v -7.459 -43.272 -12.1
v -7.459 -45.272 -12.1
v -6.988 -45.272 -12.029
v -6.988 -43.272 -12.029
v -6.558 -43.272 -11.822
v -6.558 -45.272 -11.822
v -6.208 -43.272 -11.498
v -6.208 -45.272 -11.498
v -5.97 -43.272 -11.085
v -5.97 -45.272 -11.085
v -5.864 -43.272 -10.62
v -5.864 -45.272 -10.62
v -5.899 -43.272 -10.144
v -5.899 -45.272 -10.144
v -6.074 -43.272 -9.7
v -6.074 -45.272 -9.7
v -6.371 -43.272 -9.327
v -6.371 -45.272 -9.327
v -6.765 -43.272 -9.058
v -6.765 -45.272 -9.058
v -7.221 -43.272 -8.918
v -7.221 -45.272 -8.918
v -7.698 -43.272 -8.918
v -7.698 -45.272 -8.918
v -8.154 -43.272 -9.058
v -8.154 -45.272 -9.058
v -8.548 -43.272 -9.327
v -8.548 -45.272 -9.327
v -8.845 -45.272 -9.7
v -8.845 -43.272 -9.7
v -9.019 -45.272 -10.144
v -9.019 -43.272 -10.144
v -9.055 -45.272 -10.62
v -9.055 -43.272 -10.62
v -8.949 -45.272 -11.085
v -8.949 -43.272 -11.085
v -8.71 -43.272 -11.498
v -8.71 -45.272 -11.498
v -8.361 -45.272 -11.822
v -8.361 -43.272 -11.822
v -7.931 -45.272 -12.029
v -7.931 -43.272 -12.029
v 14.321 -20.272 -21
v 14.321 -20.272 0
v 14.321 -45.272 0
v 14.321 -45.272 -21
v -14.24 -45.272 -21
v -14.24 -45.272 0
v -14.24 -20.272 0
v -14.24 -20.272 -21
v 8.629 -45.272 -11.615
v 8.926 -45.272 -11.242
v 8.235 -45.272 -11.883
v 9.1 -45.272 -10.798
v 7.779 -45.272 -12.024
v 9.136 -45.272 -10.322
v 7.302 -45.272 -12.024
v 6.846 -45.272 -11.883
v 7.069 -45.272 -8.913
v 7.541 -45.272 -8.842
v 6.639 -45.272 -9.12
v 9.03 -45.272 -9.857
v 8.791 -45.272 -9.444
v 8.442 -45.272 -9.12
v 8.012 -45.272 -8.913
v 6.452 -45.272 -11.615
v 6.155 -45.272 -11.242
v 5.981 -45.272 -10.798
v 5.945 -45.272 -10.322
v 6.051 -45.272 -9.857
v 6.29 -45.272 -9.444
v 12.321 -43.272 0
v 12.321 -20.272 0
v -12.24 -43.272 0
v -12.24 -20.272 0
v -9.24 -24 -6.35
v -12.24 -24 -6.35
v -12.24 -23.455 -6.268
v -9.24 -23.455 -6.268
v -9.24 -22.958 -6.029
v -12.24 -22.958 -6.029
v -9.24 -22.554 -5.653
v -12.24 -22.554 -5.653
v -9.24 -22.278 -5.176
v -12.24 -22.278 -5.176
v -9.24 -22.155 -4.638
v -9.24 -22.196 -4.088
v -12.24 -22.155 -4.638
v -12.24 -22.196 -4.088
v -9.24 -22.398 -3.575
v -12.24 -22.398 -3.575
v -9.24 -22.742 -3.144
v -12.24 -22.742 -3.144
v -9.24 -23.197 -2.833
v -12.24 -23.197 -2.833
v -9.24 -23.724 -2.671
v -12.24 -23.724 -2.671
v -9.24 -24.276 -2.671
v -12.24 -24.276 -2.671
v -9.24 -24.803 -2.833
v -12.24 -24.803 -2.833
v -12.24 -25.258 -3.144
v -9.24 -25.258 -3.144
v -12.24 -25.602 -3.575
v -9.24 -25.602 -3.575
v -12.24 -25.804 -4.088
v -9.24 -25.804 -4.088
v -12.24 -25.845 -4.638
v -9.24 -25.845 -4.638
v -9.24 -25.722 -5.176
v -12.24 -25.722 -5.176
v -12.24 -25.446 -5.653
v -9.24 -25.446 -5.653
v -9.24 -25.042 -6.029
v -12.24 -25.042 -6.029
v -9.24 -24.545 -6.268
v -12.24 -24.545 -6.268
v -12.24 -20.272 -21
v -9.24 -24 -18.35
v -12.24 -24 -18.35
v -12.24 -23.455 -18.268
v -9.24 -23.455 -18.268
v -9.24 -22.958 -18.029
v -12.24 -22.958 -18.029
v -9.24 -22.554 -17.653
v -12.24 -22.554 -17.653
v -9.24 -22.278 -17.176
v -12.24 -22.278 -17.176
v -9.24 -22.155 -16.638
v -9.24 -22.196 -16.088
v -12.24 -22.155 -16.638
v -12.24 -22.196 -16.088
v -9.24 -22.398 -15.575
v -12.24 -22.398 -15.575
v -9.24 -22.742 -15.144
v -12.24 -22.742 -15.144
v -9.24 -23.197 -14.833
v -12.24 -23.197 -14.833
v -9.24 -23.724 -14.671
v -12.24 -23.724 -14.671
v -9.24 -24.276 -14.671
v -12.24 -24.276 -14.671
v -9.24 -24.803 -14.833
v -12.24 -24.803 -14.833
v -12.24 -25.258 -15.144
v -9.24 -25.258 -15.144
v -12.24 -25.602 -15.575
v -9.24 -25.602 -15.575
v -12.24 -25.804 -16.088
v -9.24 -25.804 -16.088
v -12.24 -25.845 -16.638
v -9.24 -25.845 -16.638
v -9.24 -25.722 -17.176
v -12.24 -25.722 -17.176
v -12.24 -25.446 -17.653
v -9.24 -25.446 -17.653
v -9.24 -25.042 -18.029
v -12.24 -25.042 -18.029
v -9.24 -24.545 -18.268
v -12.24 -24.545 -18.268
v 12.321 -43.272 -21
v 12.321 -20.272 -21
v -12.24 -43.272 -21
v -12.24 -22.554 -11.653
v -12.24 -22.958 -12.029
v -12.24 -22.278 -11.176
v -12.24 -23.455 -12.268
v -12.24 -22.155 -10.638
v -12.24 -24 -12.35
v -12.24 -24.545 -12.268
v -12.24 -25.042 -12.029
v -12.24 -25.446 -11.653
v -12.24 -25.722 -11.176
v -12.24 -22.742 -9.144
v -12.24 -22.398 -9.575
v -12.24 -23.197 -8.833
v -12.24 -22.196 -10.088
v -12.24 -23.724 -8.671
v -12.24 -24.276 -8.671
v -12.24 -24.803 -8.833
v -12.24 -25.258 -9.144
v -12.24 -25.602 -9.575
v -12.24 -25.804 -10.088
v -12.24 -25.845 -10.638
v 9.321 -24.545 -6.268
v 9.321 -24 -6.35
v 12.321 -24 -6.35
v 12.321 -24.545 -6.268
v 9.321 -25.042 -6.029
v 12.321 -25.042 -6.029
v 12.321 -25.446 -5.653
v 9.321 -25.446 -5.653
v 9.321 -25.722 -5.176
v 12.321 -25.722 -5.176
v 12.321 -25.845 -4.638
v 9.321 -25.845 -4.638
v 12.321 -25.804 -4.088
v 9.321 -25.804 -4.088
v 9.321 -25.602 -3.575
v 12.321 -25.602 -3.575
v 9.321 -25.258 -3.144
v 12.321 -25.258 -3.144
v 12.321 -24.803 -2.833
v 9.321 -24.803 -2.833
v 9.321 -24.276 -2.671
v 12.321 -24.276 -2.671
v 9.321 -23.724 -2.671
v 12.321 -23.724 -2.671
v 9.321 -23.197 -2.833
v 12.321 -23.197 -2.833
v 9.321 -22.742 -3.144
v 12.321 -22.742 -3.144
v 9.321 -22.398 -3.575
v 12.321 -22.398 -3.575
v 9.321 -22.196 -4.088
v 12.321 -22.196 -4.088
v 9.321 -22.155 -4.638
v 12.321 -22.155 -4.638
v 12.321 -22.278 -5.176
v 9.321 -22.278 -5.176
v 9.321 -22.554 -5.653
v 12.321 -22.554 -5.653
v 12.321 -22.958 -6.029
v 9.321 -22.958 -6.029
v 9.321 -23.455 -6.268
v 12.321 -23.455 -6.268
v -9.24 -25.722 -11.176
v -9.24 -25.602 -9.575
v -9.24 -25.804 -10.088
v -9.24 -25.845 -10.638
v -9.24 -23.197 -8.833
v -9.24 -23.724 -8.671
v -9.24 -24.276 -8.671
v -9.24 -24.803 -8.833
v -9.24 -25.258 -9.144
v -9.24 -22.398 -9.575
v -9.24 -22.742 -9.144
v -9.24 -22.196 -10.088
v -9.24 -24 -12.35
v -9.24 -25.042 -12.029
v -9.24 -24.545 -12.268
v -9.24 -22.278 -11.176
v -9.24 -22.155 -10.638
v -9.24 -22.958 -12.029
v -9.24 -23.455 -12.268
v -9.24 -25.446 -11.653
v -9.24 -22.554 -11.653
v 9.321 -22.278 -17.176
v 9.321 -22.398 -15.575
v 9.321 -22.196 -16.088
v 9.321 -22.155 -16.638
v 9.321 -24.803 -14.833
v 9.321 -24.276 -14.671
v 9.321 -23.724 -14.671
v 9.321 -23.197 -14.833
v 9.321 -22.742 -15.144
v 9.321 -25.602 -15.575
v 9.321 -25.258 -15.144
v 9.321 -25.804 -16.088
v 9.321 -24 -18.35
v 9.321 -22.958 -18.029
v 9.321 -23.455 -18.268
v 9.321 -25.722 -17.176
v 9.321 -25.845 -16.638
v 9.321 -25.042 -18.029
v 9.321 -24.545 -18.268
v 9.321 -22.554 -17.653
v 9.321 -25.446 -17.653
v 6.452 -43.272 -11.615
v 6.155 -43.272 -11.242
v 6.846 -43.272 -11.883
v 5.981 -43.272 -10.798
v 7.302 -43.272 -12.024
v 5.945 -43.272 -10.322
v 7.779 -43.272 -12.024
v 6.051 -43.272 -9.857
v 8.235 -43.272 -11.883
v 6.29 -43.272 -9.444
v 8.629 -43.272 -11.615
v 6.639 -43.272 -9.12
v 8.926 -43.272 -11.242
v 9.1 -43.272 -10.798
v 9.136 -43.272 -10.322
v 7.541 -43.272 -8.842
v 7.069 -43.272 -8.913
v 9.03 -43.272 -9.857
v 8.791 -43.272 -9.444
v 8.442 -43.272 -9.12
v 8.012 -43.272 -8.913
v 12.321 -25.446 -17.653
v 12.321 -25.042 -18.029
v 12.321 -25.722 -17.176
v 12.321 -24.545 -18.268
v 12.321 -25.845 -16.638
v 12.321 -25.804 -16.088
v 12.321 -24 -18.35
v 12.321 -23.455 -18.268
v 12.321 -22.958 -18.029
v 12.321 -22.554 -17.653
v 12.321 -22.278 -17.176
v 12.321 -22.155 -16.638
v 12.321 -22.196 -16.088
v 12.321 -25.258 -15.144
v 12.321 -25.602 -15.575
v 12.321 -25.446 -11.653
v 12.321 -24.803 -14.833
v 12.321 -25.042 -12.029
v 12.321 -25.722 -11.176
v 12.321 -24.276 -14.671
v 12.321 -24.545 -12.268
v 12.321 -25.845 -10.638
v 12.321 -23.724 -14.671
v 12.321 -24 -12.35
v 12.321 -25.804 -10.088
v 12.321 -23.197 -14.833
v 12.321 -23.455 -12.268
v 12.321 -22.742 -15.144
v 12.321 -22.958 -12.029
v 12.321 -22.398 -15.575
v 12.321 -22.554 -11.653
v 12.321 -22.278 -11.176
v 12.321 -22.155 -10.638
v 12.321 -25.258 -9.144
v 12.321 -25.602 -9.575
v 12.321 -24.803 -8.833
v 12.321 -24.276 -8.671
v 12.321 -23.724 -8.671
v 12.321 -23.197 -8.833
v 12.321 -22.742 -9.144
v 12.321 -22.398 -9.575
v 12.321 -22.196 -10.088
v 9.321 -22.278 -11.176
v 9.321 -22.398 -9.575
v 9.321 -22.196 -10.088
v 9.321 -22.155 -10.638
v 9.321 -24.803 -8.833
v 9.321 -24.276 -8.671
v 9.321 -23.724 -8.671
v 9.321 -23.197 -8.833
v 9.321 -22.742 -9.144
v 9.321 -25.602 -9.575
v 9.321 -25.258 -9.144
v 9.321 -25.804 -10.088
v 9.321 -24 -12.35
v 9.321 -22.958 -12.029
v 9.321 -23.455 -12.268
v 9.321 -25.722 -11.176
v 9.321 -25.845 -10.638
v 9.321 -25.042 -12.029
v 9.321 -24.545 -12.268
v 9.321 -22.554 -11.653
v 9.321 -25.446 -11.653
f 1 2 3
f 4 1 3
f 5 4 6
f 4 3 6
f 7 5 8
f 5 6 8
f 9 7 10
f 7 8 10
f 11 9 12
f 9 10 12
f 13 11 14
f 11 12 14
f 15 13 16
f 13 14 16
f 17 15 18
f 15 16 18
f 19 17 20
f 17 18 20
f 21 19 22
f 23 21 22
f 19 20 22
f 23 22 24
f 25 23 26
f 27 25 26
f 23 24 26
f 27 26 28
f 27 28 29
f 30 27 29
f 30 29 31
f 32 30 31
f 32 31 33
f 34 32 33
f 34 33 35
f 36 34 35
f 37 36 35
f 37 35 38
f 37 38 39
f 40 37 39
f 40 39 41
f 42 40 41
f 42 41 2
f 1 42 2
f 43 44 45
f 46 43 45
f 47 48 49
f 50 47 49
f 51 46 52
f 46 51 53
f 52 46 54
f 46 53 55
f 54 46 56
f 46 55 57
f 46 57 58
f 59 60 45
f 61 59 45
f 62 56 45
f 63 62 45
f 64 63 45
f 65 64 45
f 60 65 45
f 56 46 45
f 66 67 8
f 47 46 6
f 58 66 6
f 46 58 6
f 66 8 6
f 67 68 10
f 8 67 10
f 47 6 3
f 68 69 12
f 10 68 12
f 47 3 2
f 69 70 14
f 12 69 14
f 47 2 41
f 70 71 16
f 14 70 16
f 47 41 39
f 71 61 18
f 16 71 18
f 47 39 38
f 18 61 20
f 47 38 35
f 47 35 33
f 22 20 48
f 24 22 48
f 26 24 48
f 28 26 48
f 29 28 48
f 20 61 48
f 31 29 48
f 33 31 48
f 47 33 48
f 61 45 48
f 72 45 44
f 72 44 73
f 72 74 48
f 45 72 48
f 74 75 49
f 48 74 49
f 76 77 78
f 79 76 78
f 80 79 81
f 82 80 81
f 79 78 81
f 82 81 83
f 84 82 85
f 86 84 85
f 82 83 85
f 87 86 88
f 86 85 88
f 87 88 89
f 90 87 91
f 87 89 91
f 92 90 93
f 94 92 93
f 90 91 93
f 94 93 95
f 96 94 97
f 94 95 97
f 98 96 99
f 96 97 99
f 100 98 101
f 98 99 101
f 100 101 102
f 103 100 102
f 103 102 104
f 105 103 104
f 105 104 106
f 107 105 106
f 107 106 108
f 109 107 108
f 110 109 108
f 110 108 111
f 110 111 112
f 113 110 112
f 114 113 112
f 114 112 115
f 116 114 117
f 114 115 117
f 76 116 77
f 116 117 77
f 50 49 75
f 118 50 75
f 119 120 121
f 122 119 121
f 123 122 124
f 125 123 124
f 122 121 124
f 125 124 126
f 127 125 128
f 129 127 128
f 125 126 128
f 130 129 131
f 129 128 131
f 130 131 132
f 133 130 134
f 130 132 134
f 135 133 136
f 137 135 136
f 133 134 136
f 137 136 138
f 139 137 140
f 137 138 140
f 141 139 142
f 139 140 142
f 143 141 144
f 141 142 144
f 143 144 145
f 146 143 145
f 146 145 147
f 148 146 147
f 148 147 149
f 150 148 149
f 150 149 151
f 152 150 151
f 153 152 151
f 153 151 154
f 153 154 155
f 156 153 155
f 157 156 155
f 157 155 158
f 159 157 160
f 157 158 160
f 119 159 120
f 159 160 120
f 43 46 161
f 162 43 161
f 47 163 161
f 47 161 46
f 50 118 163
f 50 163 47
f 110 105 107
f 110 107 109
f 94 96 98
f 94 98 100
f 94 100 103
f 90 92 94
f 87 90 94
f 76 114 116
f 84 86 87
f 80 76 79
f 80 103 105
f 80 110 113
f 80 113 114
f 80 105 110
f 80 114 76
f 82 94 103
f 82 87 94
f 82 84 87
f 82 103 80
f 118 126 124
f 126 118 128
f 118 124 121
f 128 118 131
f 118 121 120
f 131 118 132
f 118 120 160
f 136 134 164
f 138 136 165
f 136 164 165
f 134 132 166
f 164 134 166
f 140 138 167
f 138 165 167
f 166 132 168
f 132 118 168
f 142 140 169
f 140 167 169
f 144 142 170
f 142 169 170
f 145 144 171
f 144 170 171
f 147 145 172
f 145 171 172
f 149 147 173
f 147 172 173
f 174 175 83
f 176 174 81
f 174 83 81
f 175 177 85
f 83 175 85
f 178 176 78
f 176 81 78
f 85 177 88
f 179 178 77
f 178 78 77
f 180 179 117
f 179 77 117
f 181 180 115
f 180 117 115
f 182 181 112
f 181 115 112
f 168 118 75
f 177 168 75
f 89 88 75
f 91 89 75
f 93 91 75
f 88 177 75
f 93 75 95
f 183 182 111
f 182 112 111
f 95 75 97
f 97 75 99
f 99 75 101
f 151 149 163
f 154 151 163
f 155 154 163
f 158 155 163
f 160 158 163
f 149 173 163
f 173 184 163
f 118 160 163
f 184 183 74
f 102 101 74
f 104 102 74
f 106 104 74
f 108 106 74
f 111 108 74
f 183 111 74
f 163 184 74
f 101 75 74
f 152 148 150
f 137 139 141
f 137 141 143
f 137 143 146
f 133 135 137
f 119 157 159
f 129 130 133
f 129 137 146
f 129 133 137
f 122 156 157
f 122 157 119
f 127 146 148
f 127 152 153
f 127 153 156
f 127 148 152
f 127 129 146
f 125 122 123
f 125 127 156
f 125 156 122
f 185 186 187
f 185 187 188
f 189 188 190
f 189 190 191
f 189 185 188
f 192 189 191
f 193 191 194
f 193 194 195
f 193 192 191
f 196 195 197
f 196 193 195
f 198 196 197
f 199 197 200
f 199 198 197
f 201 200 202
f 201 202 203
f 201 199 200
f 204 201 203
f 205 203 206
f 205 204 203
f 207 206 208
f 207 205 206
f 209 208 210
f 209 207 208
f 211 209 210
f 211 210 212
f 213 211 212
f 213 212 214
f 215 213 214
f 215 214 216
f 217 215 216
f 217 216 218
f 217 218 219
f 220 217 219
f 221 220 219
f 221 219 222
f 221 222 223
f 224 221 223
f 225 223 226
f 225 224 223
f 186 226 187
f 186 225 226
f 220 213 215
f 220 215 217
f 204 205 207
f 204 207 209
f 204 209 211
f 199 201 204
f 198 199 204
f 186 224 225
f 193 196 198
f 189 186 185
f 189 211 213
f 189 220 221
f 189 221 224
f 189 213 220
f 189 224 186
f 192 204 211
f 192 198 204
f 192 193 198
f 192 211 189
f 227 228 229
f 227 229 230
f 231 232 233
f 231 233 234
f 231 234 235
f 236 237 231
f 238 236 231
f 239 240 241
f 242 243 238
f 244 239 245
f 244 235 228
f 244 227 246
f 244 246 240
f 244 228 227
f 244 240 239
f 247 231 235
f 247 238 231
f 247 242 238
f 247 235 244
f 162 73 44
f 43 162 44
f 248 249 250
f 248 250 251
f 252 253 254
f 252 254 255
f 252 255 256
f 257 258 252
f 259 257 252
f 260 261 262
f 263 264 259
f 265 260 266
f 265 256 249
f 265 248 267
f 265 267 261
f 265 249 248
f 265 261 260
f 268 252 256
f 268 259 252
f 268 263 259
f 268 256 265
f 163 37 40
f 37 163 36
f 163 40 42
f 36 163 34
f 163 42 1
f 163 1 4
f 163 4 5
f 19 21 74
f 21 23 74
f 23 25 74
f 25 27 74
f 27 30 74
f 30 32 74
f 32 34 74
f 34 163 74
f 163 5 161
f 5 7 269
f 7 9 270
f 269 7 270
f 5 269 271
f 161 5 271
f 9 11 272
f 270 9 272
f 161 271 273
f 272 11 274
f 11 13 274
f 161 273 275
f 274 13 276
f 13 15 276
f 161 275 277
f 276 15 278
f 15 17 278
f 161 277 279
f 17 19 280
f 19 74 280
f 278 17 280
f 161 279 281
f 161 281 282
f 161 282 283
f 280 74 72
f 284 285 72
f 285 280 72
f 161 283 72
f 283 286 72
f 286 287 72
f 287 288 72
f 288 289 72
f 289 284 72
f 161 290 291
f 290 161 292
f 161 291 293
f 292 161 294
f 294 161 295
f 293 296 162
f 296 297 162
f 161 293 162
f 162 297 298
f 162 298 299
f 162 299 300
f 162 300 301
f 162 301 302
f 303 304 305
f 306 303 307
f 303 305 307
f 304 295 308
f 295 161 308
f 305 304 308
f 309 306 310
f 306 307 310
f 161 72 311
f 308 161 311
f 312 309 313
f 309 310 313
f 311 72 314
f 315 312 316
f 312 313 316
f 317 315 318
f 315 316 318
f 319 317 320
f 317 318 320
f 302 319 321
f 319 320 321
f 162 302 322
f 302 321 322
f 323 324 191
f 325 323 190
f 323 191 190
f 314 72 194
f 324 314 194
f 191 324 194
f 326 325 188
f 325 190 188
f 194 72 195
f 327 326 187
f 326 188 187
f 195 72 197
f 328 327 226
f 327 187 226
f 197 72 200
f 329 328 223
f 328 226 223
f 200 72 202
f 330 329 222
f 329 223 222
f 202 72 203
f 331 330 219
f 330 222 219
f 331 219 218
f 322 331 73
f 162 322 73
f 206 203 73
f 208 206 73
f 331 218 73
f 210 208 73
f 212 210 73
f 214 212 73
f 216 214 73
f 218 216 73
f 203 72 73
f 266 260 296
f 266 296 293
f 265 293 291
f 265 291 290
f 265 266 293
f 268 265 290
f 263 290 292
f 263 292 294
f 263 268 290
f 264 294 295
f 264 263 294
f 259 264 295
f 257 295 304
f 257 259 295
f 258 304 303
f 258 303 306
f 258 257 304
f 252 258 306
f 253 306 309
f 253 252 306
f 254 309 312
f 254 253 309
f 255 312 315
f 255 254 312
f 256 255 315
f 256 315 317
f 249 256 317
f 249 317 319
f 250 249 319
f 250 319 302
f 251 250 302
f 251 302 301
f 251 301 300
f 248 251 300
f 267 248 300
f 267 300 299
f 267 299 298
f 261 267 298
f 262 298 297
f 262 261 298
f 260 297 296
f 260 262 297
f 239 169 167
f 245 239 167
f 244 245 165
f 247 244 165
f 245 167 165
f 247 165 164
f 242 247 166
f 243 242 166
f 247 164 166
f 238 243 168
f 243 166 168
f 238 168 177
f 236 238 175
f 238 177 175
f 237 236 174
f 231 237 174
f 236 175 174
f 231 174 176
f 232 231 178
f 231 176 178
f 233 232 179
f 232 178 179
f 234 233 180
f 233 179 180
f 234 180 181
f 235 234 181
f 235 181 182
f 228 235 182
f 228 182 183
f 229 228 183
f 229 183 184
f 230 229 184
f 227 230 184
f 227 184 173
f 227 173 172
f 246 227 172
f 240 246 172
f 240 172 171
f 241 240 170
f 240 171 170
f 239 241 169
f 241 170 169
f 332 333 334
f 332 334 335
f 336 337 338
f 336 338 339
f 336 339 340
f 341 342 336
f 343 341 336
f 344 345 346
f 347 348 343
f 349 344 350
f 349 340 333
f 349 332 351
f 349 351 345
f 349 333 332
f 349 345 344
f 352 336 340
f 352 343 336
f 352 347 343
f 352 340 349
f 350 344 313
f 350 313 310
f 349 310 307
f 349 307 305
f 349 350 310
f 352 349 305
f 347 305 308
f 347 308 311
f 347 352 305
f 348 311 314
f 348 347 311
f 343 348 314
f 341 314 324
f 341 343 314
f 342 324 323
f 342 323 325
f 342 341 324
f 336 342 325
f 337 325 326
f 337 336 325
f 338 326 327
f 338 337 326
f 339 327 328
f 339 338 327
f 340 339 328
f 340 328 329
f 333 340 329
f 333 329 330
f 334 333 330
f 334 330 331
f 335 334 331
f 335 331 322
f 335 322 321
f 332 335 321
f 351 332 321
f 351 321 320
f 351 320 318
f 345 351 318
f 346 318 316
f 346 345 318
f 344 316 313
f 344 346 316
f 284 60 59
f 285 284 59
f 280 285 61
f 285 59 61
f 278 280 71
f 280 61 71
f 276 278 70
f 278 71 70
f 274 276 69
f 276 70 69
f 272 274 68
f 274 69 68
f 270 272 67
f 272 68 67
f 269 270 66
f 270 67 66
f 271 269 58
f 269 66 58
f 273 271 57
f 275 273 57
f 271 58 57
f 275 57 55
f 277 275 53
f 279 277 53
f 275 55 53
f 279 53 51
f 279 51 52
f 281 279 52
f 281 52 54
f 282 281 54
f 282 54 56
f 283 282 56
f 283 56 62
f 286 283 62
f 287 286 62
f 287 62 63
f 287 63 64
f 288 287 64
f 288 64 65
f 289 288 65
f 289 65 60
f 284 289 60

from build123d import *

# Parameters (mm, degrees)
BOSS_EXTRUDE4_DEPTH = 21
SKETCH7_R           = 1.6
CUT_EXTRUDE1_DEPTH  = 3
SKETCH5_R           = 1.85
BOSS_EXTRUDE5_DEPTH = 3
BOSS_EXTRUDE6_START = 3
SKETCH8_R           = 1.85
BOSS_EXTRUDE6_DEPTH = 3


with BuildPart() as part:
    # Sketch1 → Boss-Extrude4 (new body)
    with BuildSketch(Plane.XY):
        Polygon((12.320696932, -20.271970514), (14.320696932, -20.271970514), (14.320696932, -45.271970514), (-14.239524115, -45.271970514), (-14.239524115, -20.271970514), (-12.239524115, -20.271970514), (-12.239524115, -43.271970514), (12.320696932, -43.271970514), align=None)
    extrude(amount=-BOSS_EXTRUDE4_DEPTH)

    # Sketch7 → Cut-Extrude1 (cut)
    with BuildSketch(Plane.XZ.offset(45.271970514)):
        with Locations(Location((-7.459347, -10.5, 0), (0, 0, 270))):
            Circle(SKETCH7_R)
        with Locations(Location((7.540540263, -10.441844196, 0), (0, 0, 90))):
            Circle(SKETCH7_R)
    extrude(amount=-CUT_EXTRUDE1_DEPTH, mode=Mode.SUBTRACT)

    # Sketch5 → Boss-Extrude5 (add)
    with BuildSketch(Plane(origin=(-12.239524115, 0, 0), x_dir=(0, 0, -1), z_dir=(1, 0, 0))):
        with Locations((16.5, -24)):
            Circle(SKETCH5_R)
        with Locations((10.5, -24)):
            Circle(SKETCH5_R)
        with Locations((4.5, -24)):
            Circle(SKETCH5_R)
    extrude(amount=BOSS_EXTRUDE5_DEPTH)

    # Sketch8 → Boss-Extrude6 (add)
    with BuildSketch(Plane.ZY.offset(-12.320696932).offset(BOSS_EXTRUDE6_START)):
        with Locations(Location((-16.5, -24, 0), (0, 0, 180))):
            Circle(SKETCH8_R)
        with Locations(Location((-10.5, -24, 0), (0, 0, 180))):
            Circle(SKETCH8_R)
        with Locations(Location((-4.5, -24, 0), (0, 0, 180))):
            Circle(SKETCH8_R)
    extrude(amount=-BOSS_EXTRUDE6_DEPTH)


solid = part.part
